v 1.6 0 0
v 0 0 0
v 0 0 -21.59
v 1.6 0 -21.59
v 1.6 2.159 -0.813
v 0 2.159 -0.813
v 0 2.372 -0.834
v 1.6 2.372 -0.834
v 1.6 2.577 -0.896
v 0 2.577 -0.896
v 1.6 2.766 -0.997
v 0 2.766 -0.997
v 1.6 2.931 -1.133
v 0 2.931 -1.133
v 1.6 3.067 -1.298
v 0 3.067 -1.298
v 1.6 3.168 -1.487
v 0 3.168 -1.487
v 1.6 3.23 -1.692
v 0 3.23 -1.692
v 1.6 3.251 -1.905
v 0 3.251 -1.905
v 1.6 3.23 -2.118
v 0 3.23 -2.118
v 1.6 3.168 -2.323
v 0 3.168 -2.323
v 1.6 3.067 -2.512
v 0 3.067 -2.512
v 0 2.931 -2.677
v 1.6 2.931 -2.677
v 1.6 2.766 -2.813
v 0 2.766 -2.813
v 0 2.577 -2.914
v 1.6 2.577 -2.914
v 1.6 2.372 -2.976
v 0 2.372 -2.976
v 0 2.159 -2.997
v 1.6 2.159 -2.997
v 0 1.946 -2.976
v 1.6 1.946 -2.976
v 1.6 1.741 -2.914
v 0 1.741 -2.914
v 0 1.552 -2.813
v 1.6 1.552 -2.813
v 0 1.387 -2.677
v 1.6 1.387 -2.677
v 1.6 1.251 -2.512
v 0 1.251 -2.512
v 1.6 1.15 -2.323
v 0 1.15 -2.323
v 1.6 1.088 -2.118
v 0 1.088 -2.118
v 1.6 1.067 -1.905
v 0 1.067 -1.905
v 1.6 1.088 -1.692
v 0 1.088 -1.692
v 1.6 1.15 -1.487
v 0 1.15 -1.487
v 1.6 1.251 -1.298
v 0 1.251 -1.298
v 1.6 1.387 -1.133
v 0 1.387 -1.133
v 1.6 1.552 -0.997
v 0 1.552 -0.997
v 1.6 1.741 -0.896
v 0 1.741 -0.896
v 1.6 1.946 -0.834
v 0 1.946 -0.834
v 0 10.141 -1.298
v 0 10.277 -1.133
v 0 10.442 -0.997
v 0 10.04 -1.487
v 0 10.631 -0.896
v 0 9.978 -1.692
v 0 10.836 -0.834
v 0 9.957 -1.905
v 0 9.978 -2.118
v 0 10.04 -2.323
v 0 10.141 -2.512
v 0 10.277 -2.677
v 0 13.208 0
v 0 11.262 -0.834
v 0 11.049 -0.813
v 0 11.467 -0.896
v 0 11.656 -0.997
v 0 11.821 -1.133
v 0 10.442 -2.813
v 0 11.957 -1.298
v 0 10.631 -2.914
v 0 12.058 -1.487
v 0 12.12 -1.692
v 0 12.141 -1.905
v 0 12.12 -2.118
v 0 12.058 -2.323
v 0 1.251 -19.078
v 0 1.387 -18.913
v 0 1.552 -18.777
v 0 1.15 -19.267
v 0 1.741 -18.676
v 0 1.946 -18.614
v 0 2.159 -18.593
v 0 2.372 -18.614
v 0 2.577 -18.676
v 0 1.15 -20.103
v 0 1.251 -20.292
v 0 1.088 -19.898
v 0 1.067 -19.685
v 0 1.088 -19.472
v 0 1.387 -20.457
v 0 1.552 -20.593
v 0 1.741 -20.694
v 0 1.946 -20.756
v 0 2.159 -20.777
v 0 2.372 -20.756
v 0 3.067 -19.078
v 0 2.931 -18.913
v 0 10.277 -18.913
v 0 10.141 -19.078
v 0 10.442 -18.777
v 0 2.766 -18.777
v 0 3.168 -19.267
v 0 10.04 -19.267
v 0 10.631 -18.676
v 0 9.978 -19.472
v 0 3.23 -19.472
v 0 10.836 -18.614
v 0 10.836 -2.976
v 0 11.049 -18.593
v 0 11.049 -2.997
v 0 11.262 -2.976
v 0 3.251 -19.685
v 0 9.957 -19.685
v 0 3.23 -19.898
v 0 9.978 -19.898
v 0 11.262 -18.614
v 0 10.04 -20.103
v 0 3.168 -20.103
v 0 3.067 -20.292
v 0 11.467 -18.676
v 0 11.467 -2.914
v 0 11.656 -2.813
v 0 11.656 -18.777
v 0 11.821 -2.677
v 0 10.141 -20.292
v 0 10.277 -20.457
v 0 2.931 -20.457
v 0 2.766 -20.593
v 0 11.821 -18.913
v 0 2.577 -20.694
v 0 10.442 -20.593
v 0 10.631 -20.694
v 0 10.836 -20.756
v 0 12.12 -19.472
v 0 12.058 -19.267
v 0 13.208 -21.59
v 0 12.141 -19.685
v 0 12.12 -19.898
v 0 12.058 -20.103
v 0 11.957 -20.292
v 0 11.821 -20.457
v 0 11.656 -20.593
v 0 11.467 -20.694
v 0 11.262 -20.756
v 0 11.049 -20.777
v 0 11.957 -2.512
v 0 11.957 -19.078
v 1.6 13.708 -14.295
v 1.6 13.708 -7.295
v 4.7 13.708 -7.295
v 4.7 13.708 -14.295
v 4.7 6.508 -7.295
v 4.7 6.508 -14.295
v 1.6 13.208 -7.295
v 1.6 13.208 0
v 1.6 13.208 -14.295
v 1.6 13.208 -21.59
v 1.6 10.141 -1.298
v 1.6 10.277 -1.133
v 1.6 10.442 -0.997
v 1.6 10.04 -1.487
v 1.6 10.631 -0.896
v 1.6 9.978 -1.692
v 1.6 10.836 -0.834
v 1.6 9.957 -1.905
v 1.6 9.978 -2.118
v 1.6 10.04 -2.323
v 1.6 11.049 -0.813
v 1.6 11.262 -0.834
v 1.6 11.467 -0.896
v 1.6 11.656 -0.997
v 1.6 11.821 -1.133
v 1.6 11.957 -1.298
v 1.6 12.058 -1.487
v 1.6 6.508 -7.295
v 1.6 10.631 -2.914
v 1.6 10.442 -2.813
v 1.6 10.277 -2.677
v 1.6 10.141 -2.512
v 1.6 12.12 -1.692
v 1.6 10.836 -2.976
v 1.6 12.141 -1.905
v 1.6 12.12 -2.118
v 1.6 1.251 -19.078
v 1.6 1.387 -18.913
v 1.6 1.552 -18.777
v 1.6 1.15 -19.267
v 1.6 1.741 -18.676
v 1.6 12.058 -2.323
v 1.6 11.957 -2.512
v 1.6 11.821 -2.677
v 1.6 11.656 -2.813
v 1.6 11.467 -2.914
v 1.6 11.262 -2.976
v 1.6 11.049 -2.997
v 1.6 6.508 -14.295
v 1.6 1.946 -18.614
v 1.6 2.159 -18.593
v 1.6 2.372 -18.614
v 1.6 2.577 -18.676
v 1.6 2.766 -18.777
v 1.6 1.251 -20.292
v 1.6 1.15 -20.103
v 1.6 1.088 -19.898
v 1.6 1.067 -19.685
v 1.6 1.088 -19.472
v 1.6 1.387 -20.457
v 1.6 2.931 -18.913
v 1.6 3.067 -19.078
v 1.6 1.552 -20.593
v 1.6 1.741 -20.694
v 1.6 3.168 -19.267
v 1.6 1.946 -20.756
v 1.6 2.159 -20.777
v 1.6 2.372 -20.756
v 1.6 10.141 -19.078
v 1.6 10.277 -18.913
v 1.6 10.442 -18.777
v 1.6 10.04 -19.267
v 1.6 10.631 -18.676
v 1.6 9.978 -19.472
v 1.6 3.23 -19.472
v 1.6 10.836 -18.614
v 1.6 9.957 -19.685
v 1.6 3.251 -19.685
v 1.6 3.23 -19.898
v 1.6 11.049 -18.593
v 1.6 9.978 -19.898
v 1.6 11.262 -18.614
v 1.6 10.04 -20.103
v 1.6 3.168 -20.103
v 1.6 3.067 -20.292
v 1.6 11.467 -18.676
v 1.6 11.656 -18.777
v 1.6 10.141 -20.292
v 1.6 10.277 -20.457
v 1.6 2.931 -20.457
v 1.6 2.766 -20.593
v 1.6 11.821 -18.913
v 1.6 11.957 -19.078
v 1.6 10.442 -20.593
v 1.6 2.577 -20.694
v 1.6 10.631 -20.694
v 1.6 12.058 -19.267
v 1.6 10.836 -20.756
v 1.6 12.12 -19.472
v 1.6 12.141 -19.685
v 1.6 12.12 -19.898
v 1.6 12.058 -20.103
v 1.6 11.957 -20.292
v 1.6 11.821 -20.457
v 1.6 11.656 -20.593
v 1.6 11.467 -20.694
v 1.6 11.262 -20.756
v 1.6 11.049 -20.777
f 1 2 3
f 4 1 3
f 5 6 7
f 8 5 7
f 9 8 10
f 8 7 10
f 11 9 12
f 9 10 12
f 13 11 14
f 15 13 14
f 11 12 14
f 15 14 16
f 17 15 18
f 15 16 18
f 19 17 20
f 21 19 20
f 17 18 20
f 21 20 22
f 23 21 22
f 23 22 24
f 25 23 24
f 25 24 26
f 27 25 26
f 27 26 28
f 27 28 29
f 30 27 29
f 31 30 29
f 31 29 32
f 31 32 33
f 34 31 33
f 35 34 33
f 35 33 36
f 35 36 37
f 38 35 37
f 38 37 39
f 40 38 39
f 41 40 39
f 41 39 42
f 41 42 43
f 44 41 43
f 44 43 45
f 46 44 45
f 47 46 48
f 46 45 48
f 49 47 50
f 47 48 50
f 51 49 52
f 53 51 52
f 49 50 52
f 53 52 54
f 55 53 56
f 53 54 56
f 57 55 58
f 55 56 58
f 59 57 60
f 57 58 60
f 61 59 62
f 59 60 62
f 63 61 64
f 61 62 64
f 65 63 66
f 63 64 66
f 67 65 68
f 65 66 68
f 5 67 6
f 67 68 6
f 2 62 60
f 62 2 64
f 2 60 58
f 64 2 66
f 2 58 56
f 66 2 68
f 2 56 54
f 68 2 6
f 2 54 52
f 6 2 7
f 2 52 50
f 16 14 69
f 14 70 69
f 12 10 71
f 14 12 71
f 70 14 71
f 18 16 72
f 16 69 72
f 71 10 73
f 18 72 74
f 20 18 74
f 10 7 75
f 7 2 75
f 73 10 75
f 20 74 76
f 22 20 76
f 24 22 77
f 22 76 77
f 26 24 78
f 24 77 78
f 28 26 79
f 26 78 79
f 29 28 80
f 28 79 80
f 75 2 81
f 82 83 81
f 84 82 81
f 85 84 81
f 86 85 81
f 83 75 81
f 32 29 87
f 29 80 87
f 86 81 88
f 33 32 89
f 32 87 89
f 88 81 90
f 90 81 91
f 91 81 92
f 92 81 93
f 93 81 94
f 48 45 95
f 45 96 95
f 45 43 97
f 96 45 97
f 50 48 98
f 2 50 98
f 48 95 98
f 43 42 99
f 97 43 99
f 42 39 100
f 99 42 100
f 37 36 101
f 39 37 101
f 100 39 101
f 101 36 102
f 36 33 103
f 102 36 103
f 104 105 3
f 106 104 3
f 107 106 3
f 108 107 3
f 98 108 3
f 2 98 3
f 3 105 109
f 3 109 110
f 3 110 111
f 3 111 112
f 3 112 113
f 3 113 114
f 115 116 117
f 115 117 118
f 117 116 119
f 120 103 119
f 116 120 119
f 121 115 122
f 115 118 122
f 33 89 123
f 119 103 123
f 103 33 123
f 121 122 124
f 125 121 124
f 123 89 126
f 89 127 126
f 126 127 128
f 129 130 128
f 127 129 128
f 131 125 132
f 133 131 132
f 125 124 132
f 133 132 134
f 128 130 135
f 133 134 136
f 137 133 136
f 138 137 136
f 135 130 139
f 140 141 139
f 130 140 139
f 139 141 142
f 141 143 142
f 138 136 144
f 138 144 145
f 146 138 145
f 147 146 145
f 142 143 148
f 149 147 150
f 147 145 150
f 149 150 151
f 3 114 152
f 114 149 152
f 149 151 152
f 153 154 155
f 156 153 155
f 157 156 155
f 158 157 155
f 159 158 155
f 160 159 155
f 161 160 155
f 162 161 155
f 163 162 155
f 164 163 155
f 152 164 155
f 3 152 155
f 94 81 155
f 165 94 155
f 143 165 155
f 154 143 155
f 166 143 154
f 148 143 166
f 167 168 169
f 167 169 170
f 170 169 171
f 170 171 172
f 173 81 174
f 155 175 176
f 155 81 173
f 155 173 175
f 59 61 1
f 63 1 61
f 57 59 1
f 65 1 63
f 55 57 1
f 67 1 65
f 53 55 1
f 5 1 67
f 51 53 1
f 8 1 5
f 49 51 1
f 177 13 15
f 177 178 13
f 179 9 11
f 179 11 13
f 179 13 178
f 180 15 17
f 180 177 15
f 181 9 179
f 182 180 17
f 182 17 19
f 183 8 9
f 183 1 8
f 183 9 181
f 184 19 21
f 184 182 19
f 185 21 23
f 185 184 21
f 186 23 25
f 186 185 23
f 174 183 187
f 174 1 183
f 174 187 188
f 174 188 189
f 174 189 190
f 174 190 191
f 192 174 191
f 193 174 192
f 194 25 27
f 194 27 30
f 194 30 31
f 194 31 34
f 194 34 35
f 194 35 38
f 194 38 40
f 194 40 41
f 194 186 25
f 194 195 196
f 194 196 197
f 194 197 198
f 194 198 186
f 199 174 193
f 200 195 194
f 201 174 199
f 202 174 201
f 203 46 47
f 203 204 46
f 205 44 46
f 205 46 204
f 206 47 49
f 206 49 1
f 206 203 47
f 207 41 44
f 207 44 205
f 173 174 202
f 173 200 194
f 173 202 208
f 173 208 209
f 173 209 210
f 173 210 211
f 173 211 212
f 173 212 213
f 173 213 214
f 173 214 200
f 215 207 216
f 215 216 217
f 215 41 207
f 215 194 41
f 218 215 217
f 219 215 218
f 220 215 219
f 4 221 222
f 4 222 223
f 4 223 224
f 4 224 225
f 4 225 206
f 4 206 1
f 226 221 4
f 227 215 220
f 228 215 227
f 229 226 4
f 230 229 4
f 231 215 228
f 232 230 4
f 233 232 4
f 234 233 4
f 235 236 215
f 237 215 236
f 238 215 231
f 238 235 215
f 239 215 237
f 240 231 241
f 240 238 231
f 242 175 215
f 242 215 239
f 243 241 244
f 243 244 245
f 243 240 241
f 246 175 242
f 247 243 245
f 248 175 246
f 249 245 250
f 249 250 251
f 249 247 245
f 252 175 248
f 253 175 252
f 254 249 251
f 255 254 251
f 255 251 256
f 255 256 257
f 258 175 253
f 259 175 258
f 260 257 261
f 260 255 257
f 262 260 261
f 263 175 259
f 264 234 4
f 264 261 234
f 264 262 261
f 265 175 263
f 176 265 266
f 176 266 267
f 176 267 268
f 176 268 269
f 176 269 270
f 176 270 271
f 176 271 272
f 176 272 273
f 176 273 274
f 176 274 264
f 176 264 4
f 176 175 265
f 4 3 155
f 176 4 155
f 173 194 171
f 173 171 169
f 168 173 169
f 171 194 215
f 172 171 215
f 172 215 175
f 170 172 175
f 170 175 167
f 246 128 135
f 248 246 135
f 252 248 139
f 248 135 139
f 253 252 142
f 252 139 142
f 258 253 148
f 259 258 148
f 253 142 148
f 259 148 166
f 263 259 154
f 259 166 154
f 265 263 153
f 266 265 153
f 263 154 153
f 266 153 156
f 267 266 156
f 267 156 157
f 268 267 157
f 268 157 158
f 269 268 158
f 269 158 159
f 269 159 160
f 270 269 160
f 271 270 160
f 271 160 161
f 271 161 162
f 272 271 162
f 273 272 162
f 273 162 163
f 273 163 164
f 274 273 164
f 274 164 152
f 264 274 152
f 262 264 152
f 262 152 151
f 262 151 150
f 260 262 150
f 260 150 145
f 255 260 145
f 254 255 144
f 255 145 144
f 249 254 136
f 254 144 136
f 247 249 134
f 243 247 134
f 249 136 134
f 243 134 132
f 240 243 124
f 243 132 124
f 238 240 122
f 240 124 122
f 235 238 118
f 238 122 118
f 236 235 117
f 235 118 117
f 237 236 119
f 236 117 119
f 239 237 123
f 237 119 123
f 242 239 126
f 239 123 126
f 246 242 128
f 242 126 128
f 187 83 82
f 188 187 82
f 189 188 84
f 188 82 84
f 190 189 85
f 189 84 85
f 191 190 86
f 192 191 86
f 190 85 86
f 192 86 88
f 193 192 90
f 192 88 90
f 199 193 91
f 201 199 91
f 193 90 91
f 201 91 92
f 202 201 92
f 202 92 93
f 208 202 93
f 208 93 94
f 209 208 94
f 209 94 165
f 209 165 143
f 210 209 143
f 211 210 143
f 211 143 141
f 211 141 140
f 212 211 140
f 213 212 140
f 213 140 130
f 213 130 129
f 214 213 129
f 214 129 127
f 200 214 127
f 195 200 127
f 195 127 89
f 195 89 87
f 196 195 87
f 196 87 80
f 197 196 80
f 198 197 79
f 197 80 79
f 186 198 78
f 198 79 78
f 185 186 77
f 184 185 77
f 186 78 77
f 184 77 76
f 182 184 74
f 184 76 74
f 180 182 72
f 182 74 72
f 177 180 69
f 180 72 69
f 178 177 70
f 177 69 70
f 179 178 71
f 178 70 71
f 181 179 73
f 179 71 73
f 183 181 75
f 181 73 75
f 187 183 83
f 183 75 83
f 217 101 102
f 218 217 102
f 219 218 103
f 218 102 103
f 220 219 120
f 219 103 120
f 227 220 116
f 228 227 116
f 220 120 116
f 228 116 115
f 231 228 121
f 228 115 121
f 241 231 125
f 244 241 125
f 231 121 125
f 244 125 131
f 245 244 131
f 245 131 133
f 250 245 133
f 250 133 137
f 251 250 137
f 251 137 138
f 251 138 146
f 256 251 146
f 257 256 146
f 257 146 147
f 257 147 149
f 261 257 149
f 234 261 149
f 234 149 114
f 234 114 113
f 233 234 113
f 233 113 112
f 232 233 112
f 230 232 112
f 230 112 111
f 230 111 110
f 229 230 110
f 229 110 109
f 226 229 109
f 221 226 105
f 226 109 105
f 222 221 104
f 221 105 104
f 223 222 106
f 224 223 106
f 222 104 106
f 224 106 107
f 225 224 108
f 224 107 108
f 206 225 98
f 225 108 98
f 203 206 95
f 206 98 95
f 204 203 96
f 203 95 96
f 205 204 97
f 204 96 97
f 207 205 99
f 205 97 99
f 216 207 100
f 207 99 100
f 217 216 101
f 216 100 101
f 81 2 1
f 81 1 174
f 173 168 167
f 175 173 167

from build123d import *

# Parameters (mm, degrees)
SKETCH1_W                   = 21.59
SKETCH1_H                   = 13.208
BOSS_EXTRUDE1_DEPTH         = 1.6
F_44_0_086_DIAMETER_HOLE1_D = 2.1844
SKETCH4_W                   = 7
SKETCH4_H                   = 7.2
BOSS_EXTRUDE2_DEPTH         = 3.1


with BuildPart() as part:
    # Sketch1 → Boss-Extrude1 (new body)
    with BuildSketch(Plane(origin=(0, 0, 0), x_dir=(0, 0, -1), z_dir=(1, 0, 0))):
        with Locations((10.795, 6.604)):
            Rectangle(SKETCH1_W, SKETCH1_H)
    extrude(amount=BOSS_EXTRUDE1_DEPTH)

    # #44 (0.086) Diameter Hole1 (through all)
    with Locations(Plane(origin=(1.6, 0, 0), x_dir=(0, 0, -1), z_dir=(1, 0, 0))):
        with Locations((1.905, 11.049), (19.685, 11.049), (19.685, 2.159), (1.905, 2.159)):
            Hole(F_44_0_086_DIAMETER_HOLE1_D / 2)

    # Sketch4 → Boss-Extrude2 (add)
    with BuildSketch(Plane(origin=(1.6, 0, 0), x_dir=(0, 0, -1), z_dir=(1, 0, 0))):
        with Locations((10.795, 10.108)):
            Rectangle(SKETCH4_W, SKETCH4_H)
    extrude(amount=BOSS_EXTRUDE2_DEPTH)


solid = part.part
